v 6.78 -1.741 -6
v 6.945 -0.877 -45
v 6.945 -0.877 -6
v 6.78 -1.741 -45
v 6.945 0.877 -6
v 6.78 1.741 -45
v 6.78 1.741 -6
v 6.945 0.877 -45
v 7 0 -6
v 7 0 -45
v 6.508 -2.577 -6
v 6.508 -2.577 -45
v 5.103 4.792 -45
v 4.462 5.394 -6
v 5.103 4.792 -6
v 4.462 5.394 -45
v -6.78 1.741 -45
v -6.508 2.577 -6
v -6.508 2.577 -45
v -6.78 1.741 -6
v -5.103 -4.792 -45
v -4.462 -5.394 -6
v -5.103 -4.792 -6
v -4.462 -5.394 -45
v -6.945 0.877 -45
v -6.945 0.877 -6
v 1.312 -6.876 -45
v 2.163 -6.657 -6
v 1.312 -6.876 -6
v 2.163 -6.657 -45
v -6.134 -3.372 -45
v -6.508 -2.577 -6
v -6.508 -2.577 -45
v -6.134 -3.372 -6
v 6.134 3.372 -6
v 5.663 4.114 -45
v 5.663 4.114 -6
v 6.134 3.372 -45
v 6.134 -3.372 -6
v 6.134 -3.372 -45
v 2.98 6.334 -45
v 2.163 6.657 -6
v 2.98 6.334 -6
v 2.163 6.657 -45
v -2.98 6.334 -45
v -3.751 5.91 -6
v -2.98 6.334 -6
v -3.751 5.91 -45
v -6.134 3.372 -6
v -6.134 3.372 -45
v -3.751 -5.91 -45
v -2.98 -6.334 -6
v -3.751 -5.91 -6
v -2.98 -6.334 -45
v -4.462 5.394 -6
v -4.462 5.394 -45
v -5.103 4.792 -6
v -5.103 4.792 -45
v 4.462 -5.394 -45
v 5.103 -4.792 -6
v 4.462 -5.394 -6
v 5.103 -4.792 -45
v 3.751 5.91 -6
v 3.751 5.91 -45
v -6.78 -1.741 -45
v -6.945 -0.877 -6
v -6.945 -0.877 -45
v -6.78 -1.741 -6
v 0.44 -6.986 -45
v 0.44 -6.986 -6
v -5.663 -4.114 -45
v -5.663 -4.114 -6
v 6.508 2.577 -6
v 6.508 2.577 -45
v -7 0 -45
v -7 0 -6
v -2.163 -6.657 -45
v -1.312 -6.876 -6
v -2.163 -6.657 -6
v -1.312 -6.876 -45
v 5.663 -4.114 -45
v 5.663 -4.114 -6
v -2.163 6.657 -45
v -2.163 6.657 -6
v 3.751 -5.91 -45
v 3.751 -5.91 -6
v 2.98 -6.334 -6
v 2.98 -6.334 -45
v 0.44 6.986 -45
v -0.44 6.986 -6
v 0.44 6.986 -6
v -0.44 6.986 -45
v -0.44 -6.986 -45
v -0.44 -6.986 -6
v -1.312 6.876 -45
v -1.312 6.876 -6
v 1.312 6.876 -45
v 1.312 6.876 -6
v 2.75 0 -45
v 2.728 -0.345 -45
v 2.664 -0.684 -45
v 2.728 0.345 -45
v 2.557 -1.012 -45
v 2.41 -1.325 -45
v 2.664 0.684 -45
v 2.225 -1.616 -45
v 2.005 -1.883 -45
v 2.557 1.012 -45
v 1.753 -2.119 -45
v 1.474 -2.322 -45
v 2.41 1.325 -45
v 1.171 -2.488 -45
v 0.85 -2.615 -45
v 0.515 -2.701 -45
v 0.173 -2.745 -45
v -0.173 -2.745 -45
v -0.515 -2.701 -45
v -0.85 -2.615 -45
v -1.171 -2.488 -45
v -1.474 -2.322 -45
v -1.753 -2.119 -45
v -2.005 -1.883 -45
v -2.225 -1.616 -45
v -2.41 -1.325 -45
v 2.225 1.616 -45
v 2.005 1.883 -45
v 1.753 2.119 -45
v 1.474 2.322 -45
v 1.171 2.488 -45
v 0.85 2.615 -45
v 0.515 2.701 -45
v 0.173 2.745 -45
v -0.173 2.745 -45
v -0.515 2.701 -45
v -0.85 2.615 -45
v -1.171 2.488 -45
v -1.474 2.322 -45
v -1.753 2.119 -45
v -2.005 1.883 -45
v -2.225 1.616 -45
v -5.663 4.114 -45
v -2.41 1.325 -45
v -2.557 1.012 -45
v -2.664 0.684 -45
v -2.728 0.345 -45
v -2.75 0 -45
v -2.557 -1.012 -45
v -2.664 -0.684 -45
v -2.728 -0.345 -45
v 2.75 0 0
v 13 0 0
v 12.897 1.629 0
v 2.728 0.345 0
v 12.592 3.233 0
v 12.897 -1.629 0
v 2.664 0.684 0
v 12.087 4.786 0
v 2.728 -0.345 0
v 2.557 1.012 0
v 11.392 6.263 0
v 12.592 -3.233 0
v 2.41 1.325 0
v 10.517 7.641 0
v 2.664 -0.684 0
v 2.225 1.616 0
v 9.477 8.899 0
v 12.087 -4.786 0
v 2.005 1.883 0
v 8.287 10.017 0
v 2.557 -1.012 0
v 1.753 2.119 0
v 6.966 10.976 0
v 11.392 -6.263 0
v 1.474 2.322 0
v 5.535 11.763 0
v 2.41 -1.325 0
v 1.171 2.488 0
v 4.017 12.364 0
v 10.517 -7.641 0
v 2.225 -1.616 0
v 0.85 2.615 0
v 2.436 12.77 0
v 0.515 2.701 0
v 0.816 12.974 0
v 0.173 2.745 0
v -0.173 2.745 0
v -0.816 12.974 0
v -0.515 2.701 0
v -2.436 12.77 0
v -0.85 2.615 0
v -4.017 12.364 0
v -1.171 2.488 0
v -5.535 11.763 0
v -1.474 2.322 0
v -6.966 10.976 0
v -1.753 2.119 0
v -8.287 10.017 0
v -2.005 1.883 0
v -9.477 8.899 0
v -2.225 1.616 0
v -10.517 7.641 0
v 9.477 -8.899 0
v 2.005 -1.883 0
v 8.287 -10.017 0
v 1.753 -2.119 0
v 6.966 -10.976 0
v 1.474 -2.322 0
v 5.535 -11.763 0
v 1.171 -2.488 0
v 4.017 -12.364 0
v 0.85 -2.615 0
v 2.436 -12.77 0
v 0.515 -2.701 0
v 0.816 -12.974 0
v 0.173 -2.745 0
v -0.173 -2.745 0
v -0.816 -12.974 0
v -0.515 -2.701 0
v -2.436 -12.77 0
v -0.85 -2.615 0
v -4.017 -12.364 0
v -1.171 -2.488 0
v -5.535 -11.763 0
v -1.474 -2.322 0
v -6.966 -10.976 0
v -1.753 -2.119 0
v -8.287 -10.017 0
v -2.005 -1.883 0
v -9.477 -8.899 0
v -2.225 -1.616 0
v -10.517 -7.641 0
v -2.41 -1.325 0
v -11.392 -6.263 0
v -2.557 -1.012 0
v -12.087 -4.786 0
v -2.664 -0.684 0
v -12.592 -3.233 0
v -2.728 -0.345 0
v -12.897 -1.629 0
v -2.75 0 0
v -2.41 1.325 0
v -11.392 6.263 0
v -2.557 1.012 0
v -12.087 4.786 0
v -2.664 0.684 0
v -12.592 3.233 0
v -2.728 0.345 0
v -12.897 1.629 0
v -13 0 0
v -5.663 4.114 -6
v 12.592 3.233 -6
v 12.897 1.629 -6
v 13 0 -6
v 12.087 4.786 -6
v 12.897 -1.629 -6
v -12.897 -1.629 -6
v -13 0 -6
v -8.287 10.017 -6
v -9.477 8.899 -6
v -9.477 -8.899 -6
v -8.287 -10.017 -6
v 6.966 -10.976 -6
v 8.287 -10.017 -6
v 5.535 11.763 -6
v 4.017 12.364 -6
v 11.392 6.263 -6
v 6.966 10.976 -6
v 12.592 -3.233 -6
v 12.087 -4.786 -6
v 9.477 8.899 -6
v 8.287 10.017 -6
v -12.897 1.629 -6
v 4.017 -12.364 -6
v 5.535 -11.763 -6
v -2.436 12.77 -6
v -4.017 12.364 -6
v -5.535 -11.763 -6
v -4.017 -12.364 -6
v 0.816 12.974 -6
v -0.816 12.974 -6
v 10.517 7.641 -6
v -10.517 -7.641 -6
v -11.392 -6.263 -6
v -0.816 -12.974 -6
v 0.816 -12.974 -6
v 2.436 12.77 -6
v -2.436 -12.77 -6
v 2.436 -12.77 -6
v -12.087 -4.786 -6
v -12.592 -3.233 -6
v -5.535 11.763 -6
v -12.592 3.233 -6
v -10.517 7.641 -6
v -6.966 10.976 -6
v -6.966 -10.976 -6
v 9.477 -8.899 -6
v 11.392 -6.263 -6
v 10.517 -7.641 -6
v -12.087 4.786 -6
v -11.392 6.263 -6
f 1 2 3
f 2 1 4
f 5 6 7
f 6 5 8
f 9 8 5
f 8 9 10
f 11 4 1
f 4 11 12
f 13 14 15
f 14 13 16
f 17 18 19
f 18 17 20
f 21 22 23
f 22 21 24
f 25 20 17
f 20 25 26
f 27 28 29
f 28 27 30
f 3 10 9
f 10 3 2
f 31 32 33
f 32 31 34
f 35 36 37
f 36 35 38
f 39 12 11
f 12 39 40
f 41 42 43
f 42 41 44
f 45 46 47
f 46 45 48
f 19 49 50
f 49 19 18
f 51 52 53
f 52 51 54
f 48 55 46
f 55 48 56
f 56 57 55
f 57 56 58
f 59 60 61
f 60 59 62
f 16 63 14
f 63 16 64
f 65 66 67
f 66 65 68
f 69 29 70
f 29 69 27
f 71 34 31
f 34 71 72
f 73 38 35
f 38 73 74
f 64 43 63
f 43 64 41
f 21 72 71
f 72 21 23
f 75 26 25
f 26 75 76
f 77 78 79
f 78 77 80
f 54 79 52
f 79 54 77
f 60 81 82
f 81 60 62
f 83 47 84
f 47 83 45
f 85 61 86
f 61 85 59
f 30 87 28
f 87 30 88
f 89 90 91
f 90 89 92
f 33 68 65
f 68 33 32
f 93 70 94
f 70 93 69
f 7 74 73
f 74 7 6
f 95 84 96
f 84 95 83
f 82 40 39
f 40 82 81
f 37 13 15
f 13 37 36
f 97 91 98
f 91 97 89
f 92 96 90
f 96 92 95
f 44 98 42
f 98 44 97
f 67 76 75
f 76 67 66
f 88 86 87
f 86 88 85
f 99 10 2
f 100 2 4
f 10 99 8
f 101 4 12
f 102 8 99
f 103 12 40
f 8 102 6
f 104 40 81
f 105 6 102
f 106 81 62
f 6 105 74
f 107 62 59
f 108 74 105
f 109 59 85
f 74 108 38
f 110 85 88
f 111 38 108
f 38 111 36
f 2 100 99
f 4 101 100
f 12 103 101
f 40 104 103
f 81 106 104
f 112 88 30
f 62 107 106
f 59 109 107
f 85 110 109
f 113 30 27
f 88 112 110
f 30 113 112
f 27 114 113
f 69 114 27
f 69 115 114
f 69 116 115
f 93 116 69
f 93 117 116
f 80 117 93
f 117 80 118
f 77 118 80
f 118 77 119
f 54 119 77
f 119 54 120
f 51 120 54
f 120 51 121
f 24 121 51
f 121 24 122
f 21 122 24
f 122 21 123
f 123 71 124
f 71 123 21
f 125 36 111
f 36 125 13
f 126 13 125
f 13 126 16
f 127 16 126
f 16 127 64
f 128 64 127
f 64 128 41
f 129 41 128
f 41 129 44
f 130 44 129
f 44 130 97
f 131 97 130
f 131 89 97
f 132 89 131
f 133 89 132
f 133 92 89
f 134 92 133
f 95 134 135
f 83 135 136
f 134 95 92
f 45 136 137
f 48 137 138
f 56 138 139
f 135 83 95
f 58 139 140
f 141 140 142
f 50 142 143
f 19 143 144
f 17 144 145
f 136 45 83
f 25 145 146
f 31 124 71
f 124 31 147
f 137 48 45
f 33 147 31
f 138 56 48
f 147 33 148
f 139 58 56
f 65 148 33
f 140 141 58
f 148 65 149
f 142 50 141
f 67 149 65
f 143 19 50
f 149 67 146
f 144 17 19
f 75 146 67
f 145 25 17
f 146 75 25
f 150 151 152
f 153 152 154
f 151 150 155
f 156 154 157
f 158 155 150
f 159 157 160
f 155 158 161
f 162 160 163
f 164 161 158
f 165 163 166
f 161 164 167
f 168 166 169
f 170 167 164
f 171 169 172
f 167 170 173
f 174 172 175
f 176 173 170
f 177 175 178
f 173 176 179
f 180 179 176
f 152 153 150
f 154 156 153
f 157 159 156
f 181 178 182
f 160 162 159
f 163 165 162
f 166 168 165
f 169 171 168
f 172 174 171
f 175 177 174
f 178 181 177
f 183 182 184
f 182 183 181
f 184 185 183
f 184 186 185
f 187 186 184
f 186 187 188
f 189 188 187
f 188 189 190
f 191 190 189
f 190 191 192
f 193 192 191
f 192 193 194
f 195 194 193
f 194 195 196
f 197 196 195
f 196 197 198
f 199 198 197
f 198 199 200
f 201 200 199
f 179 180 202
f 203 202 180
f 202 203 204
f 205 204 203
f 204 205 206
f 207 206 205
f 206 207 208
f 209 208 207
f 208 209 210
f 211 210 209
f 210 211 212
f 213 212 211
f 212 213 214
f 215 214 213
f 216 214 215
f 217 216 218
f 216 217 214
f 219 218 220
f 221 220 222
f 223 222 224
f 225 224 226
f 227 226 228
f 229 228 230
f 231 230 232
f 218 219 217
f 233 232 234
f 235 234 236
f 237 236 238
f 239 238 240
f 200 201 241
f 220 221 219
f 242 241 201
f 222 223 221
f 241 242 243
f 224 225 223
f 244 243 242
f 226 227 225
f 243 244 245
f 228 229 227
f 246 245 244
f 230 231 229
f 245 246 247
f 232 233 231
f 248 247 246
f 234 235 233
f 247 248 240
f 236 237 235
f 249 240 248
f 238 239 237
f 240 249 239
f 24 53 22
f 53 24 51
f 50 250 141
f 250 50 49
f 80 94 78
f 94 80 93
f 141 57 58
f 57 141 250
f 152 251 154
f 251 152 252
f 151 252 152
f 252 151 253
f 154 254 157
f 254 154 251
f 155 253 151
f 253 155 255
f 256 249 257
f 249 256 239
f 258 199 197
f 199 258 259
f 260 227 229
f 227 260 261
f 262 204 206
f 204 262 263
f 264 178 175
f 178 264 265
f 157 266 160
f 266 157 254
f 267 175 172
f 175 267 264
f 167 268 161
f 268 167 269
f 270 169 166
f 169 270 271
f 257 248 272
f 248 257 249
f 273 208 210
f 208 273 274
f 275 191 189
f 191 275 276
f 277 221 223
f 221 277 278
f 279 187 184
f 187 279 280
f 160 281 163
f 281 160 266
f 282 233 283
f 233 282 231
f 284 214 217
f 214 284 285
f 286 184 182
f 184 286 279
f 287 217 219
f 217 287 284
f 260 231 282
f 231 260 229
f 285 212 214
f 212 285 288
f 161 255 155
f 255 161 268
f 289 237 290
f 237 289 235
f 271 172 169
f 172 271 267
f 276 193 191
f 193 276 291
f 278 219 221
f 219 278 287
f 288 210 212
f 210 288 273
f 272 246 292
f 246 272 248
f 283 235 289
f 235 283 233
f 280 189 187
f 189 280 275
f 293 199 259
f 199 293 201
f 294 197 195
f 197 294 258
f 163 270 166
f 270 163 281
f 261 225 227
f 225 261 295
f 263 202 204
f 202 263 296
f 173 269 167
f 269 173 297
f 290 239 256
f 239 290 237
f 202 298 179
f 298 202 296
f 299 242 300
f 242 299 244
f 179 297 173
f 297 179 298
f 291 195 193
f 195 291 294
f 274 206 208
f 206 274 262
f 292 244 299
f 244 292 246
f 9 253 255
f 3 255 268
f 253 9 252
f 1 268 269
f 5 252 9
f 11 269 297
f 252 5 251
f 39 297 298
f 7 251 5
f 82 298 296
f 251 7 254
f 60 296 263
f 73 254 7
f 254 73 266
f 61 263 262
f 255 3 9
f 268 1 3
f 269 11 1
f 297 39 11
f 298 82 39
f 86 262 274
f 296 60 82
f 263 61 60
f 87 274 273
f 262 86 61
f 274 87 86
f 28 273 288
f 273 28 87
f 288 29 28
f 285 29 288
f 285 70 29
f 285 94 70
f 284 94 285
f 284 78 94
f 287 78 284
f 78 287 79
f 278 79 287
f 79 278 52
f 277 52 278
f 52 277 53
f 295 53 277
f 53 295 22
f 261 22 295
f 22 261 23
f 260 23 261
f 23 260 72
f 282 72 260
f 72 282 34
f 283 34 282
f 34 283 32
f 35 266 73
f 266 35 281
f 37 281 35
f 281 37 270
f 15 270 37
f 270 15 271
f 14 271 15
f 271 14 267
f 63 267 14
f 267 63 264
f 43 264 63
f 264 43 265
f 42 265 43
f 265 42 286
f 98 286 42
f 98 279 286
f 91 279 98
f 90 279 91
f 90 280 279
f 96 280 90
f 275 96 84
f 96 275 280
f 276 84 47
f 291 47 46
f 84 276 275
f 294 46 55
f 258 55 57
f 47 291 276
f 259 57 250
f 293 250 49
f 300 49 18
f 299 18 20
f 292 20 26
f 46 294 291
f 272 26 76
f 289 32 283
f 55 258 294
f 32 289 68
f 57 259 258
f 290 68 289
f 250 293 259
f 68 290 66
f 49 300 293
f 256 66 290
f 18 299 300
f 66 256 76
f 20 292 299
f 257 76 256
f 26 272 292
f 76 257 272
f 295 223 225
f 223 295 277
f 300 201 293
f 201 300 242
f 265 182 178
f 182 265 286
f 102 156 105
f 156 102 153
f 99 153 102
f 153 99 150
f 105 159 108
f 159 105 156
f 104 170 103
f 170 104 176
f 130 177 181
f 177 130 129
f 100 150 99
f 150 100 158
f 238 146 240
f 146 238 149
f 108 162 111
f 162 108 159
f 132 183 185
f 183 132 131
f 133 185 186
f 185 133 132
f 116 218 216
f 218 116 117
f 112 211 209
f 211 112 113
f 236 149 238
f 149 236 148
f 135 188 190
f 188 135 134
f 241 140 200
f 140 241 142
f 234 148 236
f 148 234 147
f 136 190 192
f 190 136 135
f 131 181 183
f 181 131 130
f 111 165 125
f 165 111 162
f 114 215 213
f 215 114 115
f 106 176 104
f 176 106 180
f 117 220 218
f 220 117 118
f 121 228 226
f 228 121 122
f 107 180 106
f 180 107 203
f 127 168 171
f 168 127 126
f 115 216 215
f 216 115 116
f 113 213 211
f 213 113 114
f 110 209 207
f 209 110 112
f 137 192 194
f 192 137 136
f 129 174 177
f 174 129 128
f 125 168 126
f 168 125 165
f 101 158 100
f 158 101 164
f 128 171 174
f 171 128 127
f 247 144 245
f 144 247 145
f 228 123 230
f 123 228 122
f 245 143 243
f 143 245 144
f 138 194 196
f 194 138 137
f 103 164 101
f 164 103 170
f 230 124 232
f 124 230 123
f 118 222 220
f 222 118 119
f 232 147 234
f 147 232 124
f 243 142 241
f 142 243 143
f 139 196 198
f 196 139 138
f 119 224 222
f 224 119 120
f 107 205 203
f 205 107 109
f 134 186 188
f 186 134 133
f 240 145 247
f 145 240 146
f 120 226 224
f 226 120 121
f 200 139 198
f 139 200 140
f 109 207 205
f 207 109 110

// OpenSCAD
$fn = 50;


difference() {
	union() {
		translate(v = [0, 0, -45.0000000000]) {
			cylinder(h = 45, r = 7.0000000000);
		}
		translate(v = [0, 0, -6.0000000000]) {
			cylinder(h = 6, r = 13.0000000000);
		}
	}
	union() {
		#translate(v = [0, 0, -45]) {
			cylinder(h = 45, r = 2.7500000000);
		}
	}
}
